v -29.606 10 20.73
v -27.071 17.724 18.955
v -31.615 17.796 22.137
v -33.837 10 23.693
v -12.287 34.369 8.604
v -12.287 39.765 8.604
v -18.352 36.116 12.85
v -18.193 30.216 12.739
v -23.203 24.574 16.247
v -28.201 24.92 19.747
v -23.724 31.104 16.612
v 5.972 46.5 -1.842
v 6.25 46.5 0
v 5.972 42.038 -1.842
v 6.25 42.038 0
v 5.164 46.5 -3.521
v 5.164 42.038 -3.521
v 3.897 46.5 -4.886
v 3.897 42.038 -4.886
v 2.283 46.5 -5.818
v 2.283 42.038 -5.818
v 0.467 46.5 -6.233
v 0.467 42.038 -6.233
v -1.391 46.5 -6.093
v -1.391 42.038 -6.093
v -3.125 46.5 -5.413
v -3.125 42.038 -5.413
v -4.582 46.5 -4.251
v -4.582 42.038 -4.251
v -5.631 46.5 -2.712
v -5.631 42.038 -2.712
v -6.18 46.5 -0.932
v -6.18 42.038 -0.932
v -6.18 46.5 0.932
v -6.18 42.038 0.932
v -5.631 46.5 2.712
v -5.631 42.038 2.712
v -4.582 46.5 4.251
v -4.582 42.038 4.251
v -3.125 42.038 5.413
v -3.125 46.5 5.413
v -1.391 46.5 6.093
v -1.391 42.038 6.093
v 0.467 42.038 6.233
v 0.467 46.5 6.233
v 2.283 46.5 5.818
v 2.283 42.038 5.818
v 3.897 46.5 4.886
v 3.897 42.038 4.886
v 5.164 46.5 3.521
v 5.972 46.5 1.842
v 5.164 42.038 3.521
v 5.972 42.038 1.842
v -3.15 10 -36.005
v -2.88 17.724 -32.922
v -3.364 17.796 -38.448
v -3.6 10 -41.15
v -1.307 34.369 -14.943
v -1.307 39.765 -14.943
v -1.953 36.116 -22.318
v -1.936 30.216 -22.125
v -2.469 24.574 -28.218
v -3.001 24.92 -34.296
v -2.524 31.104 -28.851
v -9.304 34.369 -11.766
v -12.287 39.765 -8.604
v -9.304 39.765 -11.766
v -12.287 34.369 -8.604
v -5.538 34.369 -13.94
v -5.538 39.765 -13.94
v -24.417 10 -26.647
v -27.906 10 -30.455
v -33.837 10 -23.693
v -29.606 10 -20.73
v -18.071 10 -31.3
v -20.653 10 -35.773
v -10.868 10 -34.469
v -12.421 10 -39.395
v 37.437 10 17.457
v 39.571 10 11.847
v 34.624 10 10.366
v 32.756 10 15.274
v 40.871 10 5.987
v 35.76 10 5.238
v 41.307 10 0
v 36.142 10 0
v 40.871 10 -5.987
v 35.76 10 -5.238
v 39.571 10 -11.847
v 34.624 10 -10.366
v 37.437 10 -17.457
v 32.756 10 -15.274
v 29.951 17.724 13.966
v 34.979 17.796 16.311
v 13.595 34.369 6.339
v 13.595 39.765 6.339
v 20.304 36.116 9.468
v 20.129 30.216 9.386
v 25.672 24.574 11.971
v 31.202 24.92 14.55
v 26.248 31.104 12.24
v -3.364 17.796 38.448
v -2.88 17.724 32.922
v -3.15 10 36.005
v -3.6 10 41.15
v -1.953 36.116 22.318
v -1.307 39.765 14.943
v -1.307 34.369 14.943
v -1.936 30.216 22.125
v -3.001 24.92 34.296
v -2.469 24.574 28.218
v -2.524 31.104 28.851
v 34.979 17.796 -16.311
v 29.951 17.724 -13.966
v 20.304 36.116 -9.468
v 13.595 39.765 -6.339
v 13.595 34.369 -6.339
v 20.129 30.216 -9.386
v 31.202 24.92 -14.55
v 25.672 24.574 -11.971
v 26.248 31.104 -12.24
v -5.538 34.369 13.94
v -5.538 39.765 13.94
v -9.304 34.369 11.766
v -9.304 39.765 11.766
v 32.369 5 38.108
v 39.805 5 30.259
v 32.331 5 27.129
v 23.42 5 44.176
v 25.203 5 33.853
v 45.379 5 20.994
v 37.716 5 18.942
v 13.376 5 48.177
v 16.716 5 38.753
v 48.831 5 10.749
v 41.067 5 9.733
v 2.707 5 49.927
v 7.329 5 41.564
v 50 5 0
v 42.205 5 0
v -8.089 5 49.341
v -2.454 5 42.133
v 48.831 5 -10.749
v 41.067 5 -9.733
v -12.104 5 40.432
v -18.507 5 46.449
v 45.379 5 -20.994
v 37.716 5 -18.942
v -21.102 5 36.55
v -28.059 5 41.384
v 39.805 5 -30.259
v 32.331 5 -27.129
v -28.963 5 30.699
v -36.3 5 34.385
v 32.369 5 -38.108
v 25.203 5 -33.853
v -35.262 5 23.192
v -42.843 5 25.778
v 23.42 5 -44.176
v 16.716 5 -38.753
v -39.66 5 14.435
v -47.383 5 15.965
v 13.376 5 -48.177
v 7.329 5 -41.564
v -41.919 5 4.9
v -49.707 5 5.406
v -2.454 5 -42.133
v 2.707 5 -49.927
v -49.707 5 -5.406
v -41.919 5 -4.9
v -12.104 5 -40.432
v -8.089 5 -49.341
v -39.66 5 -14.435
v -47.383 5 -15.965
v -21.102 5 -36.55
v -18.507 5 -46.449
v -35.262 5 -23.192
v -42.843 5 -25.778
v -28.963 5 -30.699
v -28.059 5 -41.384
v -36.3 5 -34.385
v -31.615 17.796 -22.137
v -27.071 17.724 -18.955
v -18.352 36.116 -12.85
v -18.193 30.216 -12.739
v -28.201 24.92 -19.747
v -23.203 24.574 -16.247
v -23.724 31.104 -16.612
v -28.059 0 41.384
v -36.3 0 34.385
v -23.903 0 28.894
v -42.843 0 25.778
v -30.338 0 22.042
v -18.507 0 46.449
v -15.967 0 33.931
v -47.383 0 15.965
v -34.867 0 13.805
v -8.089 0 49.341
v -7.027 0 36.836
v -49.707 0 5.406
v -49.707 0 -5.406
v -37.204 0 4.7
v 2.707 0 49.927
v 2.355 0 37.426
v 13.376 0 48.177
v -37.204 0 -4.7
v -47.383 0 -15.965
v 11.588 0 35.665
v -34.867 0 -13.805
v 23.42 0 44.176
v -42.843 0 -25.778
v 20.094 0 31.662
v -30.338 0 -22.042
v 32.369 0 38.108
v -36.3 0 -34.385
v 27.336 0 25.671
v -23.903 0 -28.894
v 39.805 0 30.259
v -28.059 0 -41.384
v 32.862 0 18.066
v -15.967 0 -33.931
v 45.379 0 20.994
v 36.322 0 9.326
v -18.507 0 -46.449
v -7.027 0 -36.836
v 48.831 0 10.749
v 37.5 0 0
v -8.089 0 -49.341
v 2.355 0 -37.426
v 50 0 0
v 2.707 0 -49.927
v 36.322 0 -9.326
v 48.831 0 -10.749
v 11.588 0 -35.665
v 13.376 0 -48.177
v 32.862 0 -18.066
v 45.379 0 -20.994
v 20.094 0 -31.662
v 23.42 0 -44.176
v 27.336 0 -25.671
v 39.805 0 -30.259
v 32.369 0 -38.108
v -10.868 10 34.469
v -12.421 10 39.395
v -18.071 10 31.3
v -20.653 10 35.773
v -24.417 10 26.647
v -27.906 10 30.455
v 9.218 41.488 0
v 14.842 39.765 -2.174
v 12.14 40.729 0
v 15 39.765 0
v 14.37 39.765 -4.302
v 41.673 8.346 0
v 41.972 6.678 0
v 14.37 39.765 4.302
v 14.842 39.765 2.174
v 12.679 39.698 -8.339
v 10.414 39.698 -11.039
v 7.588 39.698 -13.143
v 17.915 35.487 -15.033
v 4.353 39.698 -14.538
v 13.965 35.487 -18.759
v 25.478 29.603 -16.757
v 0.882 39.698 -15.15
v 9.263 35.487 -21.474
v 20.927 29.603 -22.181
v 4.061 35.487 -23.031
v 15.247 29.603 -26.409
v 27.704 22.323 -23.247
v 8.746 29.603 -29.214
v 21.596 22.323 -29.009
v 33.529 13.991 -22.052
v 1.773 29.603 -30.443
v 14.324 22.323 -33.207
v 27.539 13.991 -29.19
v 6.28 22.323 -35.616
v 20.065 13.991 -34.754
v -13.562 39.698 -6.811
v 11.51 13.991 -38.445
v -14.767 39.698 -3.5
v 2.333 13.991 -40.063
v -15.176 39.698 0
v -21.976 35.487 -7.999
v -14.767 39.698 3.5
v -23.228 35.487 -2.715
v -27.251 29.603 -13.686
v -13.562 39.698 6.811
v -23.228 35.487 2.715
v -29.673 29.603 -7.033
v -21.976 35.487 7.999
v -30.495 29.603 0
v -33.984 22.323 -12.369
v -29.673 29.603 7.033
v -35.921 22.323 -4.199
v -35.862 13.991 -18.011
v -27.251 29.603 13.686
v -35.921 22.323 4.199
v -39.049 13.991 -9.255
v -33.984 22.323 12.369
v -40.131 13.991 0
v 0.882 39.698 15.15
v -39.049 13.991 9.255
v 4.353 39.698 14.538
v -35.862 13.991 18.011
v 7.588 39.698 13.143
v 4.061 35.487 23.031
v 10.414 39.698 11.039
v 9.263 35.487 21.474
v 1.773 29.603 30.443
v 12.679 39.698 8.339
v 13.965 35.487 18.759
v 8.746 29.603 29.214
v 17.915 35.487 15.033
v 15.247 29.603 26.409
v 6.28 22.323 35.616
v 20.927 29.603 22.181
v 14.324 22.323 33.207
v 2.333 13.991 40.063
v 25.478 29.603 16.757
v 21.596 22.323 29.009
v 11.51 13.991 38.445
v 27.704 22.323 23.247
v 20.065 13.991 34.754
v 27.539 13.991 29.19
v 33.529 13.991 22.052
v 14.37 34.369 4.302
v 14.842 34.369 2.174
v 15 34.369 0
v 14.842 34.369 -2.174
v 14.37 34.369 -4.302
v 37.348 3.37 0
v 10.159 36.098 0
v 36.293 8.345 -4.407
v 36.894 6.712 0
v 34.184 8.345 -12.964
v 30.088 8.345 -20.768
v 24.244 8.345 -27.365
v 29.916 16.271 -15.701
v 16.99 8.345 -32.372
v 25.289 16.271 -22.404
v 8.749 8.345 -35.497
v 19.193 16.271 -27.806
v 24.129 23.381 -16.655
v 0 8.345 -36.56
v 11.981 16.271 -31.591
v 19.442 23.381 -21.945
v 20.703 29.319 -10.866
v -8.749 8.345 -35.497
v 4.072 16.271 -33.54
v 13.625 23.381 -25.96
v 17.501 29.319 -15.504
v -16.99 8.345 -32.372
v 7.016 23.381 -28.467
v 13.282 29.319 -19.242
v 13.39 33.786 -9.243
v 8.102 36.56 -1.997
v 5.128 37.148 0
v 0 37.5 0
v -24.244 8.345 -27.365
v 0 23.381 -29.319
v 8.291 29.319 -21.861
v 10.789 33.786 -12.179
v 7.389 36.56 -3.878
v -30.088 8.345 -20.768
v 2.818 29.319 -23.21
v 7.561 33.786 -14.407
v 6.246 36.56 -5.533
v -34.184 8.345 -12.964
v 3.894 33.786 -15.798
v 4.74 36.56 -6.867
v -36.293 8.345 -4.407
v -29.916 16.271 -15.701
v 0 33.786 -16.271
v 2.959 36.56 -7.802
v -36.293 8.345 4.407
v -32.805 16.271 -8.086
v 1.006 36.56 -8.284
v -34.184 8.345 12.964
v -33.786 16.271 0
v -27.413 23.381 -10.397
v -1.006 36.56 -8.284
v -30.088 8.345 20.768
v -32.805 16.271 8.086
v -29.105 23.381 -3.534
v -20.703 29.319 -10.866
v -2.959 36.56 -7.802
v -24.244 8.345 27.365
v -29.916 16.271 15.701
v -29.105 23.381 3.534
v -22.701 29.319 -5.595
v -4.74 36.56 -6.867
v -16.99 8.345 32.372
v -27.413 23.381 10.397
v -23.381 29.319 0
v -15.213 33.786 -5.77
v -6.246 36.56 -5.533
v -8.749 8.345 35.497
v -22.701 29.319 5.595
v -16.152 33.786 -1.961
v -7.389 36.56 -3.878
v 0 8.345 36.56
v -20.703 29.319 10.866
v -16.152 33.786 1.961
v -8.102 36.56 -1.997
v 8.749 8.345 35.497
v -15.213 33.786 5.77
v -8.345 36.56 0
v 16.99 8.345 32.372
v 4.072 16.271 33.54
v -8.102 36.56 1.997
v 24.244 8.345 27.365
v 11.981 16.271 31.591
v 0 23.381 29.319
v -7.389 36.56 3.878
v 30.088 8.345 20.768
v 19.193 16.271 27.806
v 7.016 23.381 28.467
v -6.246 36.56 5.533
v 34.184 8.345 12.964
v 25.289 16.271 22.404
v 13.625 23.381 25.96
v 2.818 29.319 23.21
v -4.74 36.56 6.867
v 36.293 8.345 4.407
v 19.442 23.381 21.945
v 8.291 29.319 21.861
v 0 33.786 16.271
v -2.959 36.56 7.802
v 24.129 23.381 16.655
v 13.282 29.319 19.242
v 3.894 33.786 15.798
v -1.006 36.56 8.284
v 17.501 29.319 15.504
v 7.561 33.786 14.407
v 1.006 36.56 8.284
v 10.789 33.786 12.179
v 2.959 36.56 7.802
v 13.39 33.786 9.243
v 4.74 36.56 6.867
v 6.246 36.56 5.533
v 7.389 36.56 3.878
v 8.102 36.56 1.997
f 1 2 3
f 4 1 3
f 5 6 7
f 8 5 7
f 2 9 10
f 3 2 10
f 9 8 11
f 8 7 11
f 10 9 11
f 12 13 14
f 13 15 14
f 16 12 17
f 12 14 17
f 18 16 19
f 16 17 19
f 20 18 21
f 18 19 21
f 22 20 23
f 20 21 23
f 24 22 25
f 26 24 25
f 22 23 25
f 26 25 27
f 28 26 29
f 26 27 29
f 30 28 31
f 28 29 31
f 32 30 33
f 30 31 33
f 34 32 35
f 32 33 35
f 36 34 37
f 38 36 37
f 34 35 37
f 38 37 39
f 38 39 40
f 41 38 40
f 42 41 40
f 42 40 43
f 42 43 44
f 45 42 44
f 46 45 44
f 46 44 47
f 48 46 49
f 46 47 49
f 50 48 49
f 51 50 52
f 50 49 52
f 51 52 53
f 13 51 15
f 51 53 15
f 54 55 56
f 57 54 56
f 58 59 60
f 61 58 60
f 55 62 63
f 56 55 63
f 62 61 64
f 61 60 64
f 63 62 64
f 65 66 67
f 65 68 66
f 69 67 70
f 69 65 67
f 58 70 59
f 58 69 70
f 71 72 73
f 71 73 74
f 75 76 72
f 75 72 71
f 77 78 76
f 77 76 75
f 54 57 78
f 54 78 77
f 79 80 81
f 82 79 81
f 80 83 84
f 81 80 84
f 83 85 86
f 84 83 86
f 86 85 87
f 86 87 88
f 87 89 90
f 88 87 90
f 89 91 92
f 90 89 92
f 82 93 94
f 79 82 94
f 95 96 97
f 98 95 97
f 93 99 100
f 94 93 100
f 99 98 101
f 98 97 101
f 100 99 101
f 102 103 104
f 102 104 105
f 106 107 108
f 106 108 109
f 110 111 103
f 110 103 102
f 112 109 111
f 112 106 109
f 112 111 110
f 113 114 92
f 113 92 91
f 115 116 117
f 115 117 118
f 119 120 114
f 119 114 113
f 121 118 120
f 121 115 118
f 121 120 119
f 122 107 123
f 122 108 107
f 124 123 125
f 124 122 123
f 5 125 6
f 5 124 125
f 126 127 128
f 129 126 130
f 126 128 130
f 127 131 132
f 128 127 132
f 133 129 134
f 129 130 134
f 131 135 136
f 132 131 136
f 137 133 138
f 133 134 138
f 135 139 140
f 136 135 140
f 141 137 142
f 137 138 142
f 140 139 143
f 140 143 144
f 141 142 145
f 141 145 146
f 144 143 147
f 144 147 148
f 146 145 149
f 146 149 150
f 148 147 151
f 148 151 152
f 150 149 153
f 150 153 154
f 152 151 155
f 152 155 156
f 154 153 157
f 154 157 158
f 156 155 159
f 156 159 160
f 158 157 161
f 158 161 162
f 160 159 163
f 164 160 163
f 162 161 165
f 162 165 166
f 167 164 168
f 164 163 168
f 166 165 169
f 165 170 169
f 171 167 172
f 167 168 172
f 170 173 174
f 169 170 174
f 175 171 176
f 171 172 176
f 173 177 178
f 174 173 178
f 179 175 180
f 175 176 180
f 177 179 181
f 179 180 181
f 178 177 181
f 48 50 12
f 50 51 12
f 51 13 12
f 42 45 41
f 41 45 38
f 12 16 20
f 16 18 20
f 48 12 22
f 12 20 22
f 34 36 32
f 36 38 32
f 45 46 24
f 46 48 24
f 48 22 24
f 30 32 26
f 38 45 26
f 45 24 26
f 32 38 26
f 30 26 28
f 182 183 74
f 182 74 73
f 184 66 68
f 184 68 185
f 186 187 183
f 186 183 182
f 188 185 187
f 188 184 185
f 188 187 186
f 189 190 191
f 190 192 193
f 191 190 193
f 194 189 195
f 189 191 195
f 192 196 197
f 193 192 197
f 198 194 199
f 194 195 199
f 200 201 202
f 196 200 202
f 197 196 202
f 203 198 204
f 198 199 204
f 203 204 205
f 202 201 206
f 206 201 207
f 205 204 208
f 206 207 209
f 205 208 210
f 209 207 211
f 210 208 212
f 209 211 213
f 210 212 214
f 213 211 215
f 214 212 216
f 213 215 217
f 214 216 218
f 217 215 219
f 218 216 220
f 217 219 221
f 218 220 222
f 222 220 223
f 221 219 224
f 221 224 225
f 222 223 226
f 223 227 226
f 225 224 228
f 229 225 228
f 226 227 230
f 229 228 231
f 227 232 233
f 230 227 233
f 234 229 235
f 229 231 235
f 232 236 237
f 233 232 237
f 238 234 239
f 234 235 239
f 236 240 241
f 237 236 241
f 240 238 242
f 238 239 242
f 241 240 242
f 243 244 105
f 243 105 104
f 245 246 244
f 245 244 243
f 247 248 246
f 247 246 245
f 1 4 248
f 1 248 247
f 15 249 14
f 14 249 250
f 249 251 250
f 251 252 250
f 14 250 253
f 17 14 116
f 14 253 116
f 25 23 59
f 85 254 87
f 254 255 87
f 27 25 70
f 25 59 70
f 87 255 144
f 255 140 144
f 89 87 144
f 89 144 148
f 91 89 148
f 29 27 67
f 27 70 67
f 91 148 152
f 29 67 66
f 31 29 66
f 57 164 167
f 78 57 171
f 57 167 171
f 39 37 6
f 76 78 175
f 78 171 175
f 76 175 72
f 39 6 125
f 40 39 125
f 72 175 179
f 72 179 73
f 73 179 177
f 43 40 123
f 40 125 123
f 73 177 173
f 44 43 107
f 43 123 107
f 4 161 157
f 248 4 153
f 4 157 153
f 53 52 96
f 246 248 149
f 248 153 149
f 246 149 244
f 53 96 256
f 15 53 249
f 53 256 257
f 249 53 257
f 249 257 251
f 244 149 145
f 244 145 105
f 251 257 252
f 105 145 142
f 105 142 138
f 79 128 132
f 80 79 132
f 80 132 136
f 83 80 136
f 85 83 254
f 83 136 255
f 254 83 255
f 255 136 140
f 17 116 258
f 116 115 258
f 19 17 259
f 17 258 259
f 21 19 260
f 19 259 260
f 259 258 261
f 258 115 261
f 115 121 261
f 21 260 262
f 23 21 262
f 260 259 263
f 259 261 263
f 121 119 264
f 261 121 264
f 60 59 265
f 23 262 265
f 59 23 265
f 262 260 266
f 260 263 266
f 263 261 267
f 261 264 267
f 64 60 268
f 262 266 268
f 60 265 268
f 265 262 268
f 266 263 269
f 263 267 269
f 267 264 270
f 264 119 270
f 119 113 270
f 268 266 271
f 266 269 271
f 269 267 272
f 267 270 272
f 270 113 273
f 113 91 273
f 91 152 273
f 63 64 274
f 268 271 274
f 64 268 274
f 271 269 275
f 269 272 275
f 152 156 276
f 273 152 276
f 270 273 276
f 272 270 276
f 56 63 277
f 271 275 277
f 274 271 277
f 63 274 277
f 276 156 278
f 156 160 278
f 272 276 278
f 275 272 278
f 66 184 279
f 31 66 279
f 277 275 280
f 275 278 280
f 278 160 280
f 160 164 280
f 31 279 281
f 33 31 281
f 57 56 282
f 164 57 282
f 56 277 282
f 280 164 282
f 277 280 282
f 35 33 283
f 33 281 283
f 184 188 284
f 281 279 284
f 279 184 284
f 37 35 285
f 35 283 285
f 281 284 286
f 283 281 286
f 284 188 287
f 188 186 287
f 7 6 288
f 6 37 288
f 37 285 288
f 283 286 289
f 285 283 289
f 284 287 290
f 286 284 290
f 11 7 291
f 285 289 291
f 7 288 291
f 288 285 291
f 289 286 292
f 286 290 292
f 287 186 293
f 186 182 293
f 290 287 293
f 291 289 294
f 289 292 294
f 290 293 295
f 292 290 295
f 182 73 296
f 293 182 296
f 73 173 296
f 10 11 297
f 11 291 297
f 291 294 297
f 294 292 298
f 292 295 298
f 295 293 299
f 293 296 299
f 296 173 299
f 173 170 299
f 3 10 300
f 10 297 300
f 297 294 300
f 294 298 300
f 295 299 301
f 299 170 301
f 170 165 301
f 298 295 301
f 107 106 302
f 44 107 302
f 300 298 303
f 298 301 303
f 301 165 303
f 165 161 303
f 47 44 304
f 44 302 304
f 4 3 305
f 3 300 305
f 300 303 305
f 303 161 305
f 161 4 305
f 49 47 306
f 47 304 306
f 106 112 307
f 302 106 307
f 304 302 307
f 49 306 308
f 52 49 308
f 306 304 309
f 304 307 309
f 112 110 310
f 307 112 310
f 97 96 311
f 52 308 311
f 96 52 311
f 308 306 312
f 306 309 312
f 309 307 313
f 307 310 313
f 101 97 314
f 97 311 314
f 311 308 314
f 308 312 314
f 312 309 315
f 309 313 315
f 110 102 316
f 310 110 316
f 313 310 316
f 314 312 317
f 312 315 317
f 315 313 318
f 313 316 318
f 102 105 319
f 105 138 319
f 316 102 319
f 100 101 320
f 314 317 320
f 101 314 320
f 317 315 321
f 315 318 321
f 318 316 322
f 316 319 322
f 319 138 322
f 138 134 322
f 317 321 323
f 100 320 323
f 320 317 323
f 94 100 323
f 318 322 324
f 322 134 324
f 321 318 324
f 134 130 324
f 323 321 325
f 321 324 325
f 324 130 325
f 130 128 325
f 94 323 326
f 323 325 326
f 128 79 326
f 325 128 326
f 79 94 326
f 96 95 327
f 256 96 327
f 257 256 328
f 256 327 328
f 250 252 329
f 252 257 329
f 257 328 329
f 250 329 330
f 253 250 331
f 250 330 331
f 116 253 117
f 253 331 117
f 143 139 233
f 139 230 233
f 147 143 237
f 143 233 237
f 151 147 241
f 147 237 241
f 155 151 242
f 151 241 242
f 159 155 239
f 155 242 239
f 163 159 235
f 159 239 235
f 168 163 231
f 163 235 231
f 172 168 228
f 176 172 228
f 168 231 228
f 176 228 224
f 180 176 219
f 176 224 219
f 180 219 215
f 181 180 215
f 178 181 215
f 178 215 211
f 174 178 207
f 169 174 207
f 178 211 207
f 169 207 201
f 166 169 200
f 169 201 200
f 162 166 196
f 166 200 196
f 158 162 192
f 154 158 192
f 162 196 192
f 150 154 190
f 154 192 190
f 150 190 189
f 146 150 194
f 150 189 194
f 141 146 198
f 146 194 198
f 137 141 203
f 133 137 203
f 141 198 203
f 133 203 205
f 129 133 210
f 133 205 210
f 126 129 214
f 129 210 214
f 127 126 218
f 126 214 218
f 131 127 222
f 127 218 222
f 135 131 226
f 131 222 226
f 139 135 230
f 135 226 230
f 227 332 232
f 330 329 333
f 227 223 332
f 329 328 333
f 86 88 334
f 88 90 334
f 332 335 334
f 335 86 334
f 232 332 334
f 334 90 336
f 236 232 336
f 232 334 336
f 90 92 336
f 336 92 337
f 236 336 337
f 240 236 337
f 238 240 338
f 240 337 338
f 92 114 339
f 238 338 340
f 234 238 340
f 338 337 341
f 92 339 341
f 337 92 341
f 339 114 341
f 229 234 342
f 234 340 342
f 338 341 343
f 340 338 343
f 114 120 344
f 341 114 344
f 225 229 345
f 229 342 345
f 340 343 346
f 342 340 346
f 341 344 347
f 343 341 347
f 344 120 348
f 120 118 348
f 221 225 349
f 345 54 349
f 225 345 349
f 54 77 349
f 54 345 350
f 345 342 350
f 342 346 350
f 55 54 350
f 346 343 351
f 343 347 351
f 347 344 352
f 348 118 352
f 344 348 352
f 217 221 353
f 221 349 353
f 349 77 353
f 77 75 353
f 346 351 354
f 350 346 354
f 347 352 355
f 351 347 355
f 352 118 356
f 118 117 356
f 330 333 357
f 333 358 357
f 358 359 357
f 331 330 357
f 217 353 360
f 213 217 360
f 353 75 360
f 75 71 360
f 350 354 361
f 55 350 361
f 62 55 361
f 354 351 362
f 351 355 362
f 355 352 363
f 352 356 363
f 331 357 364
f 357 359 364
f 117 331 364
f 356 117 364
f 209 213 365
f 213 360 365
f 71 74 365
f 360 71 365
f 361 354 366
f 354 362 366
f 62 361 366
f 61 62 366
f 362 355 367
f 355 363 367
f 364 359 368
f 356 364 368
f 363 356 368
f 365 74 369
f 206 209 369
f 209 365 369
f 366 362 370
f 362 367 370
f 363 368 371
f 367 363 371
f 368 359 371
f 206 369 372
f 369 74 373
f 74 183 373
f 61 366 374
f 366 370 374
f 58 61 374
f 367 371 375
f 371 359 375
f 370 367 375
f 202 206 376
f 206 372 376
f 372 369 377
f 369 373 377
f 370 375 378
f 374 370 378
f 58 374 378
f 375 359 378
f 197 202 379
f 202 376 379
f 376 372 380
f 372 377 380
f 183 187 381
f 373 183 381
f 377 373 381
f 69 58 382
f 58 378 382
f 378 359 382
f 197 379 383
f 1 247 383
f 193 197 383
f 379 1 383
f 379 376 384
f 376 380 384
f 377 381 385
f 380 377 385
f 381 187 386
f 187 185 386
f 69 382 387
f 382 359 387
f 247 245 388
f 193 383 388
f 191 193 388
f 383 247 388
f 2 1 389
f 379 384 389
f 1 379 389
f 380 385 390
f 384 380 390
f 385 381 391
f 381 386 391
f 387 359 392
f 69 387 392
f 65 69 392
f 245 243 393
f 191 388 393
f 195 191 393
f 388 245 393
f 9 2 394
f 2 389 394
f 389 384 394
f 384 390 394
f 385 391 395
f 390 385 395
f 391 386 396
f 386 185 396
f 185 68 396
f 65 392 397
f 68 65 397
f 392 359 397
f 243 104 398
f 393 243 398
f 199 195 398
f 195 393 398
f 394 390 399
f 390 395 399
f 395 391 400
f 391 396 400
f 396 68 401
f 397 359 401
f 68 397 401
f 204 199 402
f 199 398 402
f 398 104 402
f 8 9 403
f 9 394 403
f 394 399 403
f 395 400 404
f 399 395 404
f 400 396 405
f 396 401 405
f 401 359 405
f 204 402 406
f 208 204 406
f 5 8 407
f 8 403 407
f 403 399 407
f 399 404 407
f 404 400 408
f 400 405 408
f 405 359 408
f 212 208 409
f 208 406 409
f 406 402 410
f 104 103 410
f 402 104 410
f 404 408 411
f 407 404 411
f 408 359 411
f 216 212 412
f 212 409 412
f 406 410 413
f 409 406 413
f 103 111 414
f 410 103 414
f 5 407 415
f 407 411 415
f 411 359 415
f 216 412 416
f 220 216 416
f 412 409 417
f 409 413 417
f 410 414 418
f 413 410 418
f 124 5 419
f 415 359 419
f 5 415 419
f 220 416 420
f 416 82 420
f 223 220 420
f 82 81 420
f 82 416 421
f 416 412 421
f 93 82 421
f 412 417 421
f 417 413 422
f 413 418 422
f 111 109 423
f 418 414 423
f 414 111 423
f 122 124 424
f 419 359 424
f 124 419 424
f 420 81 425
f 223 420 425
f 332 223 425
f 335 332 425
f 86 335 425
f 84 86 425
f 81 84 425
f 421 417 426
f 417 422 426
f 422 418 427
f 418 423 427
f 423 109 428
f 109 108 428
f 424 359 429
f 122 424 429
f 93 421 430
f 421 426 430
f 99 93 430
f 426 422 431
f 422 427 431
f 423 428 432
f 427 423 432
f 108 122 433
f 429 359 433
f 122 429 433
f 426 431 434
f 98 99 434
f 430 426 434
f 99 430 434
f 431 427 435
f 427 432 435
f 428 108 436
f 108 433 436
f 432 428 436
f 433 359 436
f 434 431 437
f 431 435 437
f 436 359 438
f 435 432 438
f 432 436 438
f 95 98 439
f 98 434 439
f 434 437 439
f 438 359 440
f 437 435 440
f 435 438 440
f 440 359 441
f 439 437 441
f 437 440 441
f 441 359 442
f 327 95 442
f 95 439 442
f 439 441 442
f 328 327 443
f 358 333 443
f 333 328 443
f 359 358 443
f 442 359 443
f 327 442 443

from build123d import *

# Parameters (mm, degrees)
CUT_REVOLVE_1_ANGLE      = 50
PATTERN_CIRCULAR_1_COUNT = 3


with BuildPart() as part:
    # 草图1 → 旋转1 (revolve)
    with BuildSketch(Plane.XY):
        with BuildLine():
            Line((0, 37.5), (0, 46.5))
            Line((0, 46.5), (6.25, 46.5))
            Line((6.25, 46.5), (6.25, 42.037929302))
            ThreePointArc((6.25, 42.037929302), (30.49459553, 29.60286546), (42.20485754, 5))
            Line((42.20485754, 5), (50, 5))
            Line((50, 5), (50, 0))
            Line((50, 0), (37.5, 0))
            ThreePointArc((37.5, 0), (26.516504294, 26.516504294), (0, 37.5))
        make_face()
    revolve(axis=Axis((0, 37.5, 0), (0, 1, 0)))

    # 草图2 → 切除-旋转1 (revolve, symmetric, cut)
    with BuildSketch(Plane.XY) as cut_revolve_1_sk:
        with BuildLine():
            Line((15, 39.764934301), (15, 34.369317712))
            ThreePointArc((15, 34.369317712), (28.325677697, 24.574498632), (36.142080737, 10))
            Line((36.142080737, 10), (41.306779105, 10))
            ThreePointArc((41.306779105, 10), (31.844955201, 28.145138625), (15, 39.764934301))
        make_face()
    cut_revolve_1 = revolve(axis=Axis((0, 61.674672097, 0), (0, -1, 0)), revolution_arc=CUT_REVOLVE_1_ANGLE / 2, mode=Mode.SUBTRACT)
    cut_revolve_1 = cut_revolve_1 + revolve(cut_revolve_1_sk.sketch, axis=Axis((0, 61.674672097, 0), (0, 1, 0)), revolution_arc=CUT_REVOLVE_1_ANGLE / 2, mode=Mode.SUBTRACT)

    # 阵列(圆周)1: 切除-旋转1 ×3 about axis
    pattern_circular_1_axis = Axis((0, 0, 0), (0, 1, 0))
    for i in range(1, PATTERN_CIRCULAR_1_COUNT):
        add(cut_revolve_1.rotate(pattern_circular_1_axis, i * 360 / PATTERN_CIRCULAR_1_COUNT), mode=Mode.SUBTRACT)


solid = part.part
